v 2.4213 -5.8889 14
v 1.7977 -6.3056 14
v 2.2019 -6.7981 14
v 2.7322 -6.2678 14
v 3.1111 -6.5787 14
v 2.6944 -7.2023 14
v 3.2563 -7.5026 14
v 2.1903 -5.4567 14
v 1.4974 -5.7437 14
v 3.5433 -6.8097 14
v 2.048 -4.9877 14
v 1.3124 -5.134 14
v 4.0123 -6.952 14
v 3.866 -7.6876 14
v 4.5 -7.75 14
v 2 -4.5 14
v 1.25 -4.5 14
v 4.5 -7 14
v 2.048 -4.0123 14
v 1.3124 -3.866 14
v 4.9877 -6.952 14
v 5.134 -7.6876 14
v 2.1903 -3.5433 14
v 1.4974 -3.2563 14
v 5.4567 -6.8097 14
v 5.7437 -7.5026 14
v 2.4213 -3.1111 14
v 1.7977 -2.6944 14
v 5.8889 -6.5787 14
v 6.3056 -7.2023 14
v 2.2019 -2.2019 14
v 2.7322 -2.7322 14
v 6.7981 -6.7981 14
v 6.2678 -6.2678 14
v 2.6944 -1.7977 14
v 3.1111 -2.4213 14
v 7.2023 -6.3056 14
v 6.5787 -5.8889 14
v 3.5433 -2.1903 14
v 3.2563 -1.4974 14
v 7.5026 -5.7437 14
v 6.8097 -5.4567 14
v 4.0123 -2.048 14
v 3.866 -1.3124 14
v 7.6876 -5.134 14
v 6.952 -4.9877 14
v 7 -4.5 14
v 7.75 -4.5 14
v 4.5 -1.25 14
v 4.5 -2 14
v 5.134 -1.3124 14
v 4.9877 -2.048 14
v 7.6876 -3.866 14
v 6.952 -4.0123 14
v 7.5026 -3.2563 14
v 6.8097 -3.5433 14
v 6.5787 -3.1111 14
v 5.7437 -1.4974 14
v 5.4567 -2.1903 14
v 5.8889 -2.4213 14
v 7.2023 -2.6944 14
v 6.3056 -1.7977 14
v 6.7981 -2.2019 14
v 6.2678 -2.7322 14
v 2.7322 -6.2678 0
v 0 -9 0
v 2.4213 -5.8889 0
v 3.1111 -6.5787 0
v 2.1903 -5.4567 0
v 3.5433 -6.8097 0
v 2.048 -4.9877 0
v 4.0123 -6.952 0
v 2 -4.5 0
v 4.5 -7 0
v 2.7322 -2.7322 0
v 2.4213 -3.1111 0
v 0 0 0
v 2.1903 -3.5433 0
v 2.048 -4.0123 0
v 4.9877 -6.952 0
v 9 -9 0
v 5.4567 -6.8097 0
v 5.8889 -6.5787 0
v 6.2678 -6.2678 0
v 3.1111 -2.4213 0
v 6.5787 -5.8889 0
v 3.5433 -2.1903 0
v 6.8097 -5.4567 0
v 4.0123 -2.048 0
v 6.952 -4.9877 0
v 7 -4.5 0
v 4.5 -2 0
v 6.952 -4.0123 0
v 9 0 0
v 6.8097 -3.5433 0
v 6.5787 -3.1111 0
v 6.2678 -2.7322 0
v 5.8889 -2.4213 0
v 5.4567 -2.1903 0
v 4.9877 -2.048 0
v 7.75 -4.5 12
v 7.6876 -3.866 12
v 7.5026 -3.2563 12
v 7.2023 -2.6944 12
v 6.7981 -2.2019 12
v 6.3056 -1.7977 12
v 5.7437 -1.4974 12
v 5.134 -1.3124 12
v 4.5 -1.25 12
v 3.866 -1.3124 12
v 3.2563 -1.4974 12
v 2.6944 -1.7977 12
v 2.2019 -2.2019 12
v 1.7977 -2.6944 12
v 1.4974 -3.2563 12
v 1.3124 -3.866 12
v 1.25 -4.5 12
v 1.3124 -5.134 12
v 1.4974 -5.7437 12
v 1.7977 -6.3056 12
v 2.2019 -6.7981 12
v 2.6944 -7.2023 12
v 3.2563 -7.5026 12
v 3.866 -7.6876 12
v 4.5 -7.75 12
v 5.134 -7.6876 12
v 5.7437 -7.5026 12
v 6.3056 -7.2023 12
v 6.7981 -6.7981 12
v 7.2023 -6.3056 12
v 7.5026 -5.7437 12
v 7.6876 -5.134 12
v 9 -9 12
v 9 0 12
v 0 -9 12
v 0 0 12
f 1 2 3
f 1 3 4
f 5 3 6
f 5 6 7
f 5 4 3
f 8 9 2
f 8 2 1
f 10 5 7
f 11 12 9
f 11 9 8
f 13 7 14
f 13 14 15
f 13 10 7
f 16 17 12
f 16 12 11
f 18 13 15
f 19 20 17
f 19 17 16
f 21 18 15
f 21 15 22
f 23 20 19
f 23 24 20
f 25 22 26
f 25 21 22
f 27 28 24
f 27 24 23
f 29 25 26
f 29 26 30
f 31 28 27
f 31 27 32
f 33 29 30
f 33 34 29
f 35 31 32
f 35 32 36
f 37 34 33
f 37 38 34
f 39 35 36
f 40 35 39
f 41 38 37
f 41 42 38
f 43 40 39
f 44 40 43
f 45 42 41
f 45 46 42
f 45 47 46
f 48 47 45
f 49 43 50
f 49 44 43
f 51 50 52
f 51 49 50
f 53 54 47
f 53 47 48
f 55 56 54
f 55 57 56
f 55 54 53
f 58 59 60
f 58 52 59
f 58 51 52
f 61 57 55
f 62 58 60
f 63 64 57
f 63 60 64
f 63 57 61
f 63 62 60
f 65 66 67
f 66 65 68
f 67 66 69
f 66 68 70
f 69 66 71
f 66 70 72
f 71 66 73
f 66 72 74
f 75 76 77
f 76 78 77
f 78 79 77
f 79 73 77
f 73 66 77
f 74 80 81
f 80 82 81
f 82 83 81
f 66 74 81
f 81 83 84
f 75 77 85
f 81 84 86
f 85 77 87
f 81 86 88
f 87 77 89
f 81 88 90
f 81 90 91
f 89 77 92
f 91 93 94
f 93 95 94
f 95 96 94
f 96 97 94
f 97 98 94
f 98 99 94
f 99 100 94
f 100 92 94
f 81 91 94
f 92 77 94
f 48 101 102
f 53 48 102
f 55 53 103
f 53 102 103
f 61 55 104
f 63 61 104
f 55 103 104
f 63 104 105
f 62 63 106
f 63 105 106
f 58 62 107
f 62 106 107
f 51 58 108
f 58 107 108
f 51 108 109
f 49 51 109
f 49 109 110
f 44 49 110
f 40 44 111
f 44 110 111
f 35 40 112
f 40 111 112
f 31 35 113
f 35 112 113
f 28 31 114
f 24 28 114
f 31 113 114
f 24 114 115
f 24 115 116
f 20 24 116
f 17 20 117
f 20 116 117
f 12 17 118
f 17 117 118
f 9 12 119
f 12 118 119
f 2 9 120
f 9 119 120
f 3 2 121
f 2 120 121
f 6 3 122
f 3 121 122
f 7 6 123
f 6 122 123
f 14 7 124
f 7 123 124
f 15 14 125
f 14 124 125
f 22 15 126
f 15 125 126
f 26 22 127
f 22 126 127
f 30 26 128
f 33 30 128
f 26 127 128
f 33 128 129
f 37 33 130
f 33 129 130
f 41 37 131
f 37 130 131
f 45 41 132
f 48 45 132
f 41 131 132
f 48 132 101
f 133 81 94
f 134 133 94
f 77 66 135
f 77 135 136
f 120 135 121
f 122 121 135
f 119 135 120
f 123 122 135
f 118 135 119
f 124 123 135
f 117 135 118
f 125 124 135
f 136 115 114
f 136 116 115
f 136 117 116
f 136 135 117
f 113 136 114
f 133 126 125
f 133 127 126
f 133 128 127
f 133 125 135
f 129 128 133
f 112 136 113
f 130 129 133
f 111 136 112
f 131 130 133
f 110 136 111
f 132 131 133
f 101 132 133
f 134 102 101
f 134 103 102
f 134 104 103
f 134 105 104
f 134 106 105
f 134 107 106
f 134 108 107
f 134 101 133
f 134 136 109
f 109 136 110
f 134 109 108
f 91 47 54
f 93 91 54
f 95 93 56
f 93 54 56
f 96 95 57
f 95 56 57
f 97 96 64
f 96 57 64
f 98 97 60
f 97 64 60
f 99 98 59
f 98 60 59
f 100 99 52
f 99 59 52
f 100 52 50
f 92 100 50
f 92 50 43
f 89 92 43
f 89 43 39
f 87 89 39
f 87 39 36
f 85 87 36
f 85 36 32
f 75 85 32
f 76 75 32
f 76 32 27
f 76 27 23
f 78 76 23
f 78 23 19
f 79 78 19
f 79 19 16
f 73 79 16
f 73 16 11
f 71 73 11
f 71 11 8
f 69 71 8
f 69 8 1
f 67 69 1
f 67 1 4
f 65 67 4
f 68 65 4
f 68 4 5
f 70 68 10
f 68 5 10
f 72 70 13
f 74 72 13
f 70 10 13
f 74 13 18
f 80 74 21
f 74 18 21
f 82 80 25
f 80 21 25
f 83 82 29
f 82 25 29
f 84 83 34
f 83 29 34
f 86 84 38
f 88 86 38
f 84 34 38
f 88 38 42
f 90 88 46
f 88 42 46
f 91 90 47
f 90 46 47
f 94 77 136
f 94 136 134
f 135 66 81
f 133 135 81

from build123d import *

# Parameters (mm, degrees)
SKETCH_W     = 9
SKETCH_H     = 9
SKETCH_R     = 2.5
PAD_DEPTH    = 12
SKETCH001_R  = 3.25
PAD001_DEPTH = 2
SKETCH002_R  = 2.5
POCKET_DEPTH = 2


with BuildPart() as part:
    # Sketch → Pad (new body)
    with BuildSketch(Plane.XY):
        with Locations((4.5, -4.5)):
            Rectangle(SKETCH_W, SKETCH_H)
        with Locations((4.5, -4.5)):
            Circle(SKETCH_R, mode=Mode.SUBTRACT)
    extrude(amount=PAD_DEPTH)

    # Sketch001 (on Face7 of Pad) → Pad001 (join)
    with BuildSketch(Plane.XY.offset(12)):
        with Locations((4.5, -4.5)):
            Circle(SKETCH001_R)
    extrude(amount=PAD001_DEPTH)

    # Sketch002 (on Face10 of Pad001) → Pocket (cut)
    with BuildSketch(Plane.XY.offset(14)):
        with Locations((4.5, -4.5)):
            Circle(SKETCH002_R)
    extrude(amount=-POCKET_DEPTH, mode=Mode.SUBTRACT)


solid = part.part
